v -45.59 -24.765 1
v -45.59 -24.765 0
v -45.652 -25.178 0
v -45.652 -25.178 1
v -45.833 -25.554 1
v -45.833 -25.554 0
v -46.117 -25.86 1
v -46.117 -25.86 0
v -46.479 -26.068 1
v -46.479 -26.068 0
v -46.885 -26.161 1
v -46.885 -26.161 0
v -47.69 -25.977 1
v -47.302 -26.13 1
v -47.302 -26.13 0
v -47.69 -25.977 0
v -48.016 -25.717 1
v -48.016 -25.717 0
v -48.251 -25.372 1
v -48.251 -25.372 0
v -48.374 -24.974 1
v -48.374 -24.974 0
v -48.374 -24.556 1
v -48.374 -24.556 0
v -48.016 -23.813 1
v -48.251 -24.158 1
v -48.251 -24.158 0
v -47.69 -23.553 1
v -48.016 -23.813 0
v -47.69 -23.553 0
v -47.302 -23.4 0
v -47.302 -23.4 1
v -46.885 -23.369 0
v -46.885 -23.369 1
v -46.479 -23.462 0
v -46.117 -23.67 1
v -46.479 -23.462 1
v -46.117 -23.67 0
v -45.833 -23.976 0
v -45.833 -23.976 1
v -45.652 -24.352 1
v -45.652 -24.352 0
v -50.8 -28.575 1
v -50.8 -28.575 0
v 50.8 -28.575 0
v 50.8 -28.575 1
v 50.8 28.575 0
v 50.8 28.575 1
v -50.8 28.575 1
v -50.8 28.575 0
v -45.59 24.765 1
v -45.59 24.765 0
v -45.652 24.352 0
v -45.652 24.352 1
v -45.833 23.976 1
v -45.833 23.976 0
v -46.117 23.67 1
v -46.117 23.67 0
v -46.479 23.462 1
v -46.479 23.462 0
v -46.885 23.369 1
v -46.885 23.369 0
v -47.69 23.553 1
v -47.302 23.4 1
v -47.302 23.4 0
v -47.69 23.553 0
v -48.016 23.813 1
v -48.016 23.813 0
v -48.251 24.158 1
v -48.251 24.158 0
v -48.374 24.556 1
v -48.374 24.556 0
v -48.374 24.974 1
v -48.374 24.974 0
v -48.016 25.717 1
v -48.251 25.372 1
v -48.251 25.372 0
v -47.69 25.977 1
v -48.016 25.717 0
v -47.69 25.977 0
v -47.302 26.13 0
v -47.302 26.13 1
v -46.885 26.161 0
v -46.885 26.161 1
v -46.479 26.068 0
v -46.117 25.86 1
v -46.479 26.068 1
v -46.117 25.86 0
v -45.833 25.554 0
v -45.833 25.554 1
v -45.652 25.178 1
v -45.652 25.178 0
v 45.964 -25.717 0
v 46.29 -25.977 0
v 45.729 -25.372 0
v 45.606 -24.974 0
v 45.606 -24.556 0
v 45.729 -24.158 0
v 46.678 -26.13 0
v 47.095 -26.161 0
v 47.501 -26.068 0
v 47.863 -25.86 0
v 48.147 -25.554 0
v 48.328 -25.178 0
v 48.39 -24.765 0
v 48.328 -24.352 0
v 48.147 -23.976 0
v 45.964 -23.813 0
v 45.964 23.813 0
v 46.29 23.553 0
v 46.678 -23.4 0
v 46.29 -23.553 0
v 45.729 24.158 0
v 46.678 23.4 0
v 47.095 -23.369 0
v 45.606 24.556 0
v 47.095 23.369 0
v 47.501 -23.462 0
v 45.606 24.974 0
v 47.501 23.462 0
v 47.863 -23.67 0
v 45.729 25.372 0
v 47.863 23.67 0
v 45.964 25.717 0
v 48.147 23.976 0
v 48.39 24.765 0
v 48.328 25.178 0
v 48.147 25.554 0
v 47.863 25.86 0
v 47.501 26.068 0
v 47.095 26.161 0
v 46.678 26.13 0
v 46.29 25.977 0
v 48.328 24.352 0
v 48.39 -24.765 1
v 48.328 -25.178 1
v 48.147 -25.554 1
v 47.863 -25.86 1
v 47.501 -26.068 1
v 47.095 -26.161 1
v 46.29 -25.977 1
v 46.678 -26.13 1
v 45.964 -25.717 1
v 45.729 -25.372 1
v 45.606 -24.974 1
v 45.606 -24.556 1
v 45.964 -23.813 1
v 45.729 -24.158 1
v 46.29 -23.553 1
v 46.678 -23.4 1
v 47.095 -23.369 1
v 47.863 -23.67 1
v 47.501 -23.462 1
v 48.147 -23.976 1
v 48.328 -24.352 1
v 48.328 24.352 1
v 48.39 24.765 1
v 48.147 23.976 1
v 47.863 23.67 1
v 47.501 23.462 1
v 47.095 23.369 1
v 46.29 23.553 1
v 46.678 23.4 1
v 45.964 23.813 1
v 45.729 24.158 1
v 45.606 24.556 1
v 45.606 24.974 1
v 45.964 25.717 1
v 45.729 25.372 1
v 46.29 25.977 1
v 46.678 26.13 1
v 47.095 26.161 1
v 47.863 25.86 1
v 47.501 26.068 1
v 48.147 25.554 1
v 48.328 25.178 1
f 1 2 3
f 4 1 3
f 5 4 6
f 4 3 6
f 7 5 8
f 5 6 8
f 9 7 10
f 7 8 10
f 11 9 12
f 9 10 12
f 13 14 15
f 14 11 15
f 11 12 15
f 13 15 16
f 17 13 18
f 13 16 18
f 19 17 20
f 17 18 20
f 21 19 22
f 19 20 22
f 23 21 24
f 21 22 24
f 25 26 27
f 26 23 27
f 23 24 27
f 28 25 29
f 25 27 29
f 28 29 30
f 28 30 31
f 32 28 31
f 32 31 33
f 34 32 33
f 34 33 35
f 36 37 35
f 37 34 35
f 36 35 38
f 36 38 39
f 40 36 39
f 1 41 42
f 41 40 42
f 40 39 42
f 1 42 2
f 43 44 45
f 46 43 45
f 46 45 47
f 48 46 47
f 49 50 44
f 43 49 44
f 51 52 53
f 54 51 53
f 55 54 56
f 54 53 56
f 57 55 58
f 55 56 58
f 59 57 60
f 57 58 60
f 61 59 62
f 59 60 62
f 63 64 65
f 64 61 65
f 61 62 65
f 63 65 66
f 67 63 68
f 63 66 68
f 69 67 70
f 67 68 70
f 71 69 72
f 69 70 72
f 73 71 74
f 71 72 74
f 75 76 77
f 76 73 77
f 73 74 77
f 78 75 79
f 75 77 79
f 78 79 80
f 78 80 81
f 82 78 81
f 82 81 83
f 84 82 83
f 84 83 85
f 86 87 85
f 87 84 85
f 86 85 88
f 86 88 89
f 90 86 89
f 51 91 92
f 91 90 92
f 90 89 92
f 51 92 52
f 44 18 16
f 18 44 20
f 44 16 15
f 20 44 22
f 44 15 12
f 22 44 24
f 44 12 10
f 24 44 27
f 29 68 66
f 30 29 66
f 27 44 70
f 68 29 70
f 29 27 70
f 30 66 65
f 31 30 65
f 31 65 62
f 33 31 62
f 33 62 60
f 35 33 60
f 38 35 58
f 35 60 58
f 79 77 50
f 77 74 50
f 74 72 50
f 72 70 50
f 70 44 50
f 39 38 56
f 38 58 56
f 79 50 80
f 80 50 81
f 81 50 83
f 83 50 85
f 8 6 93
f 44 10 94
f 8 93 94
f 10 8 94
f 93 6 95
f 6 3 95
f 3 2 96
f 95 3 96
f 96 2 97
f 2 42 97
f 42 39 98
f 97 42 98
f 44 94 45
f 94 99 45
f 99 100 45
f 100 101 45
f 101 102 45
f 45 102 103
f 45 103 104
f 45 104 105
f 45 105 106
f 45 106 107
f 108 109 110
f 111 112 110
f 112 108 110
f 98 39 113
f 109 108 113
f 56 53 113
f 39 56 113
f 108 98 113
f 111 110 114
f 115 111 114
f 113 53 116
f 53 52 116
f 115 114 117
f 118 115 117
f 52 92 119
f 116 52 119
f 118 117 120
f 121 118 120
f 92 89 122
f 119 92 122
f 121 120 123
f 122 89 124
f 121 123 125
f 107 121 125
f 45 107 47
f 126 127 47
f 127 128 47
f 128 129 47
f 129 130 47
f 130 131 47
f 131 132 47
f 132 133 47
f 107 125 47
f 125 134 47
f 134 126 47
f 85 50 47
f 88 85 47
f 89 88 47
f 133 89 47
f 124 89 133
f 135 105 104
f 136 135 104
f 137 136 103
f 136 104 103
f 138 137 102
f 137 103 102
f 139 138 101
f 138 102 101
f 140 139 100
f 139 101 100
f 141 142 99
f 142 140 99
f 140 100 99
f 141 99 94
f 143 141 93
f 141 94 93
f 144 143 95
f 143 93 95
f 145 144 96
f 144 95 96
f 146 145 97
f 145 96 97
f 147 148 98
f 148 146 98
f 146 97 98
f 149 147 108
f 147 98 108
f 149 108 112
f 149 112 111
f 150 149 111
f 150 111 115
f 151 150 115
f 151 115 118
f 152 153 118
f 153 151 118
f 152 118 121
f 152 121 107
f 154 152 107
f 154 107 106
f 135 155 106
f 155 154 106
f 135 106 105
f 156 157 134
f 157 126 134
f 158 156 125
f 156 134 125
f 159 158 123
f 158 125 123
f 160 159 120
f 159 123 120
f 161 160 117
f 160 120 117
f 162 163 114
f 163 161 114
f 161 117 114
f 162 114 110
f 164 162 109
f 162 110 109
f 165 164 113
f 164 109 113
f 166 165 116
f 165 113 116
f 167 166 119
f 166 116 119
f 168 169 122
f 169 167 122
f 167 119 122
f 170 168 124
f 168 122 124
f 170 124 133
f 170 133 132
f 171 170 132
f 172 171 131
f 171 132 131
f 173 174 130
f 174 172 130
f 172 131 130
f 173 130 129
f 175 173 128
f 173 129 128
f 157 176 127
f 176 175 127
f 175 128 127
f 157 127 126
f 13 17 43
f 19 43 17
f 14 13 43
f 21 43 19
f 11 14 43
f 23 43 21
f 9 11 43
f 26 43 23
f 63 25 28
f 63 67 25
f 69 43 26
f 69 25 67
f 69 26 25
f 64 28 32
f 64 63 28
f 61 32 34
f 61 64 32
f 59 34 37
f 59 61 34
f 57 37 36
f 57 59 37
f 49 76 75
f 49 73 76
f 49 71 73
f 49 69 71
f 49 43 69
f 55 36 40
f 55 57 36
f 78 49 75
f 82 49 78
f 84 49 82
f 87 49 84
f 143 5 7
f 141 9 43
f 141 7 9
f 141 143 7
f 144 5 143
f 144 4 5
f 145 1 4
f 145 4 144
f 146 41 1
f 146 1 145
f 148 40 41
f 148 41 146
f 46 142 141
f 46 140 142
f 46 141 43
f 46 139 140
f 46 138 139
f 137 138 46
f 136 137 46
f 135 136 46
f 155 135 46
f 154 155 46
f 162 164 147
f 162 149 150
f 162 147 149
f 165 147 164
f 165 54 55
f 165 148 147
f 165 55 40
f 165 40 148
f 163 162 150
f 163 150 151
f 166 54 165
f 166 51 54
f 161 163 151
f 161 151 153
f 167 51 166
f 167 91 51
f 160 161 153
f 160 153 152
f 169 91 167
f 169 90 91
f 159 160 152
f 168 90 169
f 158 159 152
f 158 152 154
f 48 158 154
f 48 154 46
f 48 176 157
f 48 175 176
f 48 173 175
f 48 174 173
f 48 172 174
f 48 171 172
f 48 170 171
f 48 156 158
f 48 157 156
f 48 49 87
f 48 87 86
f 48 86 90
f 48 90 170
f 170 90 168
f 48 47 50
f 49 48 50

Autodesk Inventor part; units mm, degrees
ref_plane "YZ Plane" through (0, 0, 0) normal (1, 0, 0) x (0, 1, 0)
ref_plane "XZ Plane" through (0, 0, 0) normal (0, 1, 0) x (-1, 0, 0)
ref_plane "XY Plane" through (0, 0, 0) normal (0, 0, 1) x (1, 0, 0)
sketch "Sketch1" plane through (0, 0, 0) normal (0, 0, 1) x (1, 0, 0)
  line L0 (-50.8, -28.575) -> (50.8, -28.575)
  line L1 (50.8, -28.575) -> (50.8, 28.575)
  line L2 (50.8, 28.575) -> (-50.8, 28.575)
  line L3 (-50.8, 28.575) -> (-50.8, -28.575)
  line L4 (-50.8, -28.575) -> (50.8, 28.575) construction
  line L5 (50.8, -28.575) -> (-50.8, 28.575) construction
  circle A0 centre (-46.99, 24.765) radius 1.4
  line L6 (-50.8, 0) -> (50.8, 0) construction
  line L7 (0, 28.575) -> (0, -28.575) construction
  circle A1 centre (-46.99, -24.765) radius 1.4
  circle A2 centre (46.99, 24.765) radius 1.4
  circle A3 centre (46.99, -24.765) radius 1.4
  circle A4 centre (-26.67, 24.765) radius 1.4
  circle A5 centre (26.67, 24.765) radius 1.4
  circle A6 centre (-26.67, -24.765) radius 1.4
  circle A7 centre (26.67, -24.765) radius 1.4
  point P0 (0, 0)
  dimension "d2" = 101.6
  dimension "d4" = 57.15
  dimension "d5" = 49.53
  dimension "d6" = 2.8
  dimension "d8" = 2.8
  dimension "d10" = 49.53
  dimension "d21" = 3.81
  dimension "d22" = 3.81
  dimension "d23" = 3.81
  dimension "d24" = 3.81
  dimension "d25" = 3.81
  dimension "d26" = 3.81
  dimension "d27" = 3.81
  dimension "d28" = 3.81
  dimension "d29" = 20.32
  dimension "d30" = 53.34
  dimension "d31" = 49.53
  dimension "d32" = 93.98
extrude "Extrusion1" add sketch "Sketch1" along normal blind 1 contours L3 L2 L1 L0 | A4 | A5 | A6 | A7
sketch "Sketch3" plane through (0, 0, 1) normal (0, 0, 1) x (1, 0, 0)
  circle A0 centre (26.67, -24.765) radius 1.4 projected
  circle A1 centre (-26.67, -24.765) radius 1.4 projected
  line L0 (50.8, 28.575) -> (-50.8, 28.575) projected
  line L1 (-21.67, -25.765) -> (21.67, -25.765)
  line L2 (21.67, -25.765) -> (21.67, 30.575)
  line L3 (21.67, 30.575) -> (-21.67, 30.575)
  line L4 (-21.67, 30.575) -> (-21.67, -25.765)
  line L5 (50.8, -28.575) -> (50.8, 28.575) projected
  line L6 (-50.8, 28.575) -> (-50.8, -28.575) projected
  point P0 (0, 0)
  dimension "d15" = 2
  dimension "d16" = 5
  dimension "d17" = 5
  dimension "d18" = 1
  dimension "d33" = 29.13
  dimension "d34" = 29.13
extrude "Extrusion3" [suppressed]
properties part number "PCB01" material "PCB(1)"
